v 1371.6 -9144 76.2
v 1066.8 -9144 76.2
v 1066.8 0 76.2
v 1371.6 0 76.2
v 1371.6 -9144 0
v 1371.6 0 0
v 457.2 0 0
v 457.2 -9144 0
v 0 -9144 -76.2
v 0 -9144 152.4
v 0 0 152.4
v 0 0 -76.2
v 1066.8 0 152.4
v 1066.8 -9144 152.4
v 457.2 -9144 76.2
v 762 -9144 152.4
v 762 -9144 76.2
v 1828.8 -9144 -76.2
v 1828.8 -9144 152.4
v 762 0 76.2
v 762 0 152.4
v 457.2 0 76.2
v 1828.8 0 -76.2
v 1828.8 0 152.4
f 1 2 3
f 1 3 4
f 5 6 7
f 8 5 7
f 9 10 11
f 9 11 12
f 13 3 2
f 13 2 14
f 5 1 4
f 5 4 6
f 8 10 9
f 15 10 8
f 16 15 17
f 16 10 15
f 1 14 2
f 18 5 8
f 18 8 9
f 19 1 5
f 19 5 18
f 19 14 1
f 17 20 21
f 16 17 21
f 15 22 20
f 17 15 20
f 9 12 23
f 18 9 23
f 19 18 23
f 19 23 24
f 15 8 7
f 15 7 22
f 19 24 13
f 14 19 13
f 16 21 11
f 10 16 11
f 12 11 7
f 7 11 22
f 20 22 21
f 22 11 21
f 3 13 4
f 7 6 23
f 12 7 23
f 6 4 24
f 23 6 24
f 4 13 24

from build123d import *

# Parameters (mm, degrees)
F0_W     = 457.2
F0_H     = 76.2
F0_W_2   = 304.8
F1_DEPTH = 9144


with BuildPart() as f1:
    # F0 (on Front) → F1 (new body)
    with BuildSketch(Plane.XZ):
        with Locations((228.6, 38.1)):
            Rectangle(F0_W, F0_H)
        Polygon((457.2, 0), (0, 0), (0, -76.2), (1828.8, -76.2), (1828.8, 0), (1371.6, 0), align=None)
        with Locations((228.6, 114.3)):
            Rectangle(F0_W, F0_H)
        with Locations((1600.2, 38.1)):
            Rectangle(F0_W, F0_H)
        with Locations((609.6, 114.3)):
            Rectangle(F0_W_2, F0_H)
        with Locations((1600.2, 114.3)):
            Rectangle(F0_W, F0_H)
        with Locations((1219.2, 114.3)):
            Rectangle(F0_W_2, F0_H)
    extrude(amount=F1_DEPTH)


solid = f1.part
